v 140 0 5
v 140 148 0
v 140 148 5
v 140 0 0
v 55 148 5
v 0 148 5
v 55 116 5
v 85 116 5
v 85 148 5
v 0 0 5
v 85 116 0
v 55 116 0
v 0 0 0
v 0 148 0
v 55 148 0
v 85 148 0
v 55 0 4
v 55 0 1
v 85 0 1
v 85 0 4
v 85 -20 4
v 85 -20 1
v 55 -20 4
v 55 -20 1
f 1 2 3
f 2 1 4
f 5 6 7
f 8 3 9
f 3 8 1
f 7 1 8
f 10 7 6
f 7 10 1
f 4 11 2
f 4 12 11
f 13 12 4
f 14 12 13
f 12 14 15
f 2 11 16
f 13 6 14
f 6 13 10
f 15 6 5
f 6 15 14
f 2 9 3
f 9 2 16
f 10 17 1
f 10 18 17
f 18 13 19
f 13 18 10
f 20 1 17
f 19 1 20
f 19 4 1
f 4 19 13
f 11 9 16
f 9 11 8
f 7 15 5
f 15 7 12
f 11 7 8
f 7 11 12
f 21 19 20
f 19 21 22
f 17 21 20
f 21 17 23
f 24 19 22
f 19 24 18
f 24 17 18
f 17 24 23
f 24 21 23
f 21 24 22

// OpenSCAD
/*
        ENAMEL PROJECT - MELANIE BALJKO
        MODELLING FOR VERSION 2
        CREATED BY: SHWETA DIXIT - 2017
        
        TITLE --- VERSION 2 - SLIDER TO SEPARATE BOX IN TWO LAYERS
        
        (Measurements in mm)
        
*/

// Modelling the slider to separate the box in two layers
module slider_layer()
{
    
    difference()
    {
        cube([140, 148, 5]);  
    
        // Adding the hole to let wires through
        translate([55, 116, 0])
        {
            cube([30, 32, 5]);
        }
    }
    
    // Adding the handle
    translate([55, -20, 1])
    {
        cube([30, 20, 3]);
    }
}
slider_layer();
